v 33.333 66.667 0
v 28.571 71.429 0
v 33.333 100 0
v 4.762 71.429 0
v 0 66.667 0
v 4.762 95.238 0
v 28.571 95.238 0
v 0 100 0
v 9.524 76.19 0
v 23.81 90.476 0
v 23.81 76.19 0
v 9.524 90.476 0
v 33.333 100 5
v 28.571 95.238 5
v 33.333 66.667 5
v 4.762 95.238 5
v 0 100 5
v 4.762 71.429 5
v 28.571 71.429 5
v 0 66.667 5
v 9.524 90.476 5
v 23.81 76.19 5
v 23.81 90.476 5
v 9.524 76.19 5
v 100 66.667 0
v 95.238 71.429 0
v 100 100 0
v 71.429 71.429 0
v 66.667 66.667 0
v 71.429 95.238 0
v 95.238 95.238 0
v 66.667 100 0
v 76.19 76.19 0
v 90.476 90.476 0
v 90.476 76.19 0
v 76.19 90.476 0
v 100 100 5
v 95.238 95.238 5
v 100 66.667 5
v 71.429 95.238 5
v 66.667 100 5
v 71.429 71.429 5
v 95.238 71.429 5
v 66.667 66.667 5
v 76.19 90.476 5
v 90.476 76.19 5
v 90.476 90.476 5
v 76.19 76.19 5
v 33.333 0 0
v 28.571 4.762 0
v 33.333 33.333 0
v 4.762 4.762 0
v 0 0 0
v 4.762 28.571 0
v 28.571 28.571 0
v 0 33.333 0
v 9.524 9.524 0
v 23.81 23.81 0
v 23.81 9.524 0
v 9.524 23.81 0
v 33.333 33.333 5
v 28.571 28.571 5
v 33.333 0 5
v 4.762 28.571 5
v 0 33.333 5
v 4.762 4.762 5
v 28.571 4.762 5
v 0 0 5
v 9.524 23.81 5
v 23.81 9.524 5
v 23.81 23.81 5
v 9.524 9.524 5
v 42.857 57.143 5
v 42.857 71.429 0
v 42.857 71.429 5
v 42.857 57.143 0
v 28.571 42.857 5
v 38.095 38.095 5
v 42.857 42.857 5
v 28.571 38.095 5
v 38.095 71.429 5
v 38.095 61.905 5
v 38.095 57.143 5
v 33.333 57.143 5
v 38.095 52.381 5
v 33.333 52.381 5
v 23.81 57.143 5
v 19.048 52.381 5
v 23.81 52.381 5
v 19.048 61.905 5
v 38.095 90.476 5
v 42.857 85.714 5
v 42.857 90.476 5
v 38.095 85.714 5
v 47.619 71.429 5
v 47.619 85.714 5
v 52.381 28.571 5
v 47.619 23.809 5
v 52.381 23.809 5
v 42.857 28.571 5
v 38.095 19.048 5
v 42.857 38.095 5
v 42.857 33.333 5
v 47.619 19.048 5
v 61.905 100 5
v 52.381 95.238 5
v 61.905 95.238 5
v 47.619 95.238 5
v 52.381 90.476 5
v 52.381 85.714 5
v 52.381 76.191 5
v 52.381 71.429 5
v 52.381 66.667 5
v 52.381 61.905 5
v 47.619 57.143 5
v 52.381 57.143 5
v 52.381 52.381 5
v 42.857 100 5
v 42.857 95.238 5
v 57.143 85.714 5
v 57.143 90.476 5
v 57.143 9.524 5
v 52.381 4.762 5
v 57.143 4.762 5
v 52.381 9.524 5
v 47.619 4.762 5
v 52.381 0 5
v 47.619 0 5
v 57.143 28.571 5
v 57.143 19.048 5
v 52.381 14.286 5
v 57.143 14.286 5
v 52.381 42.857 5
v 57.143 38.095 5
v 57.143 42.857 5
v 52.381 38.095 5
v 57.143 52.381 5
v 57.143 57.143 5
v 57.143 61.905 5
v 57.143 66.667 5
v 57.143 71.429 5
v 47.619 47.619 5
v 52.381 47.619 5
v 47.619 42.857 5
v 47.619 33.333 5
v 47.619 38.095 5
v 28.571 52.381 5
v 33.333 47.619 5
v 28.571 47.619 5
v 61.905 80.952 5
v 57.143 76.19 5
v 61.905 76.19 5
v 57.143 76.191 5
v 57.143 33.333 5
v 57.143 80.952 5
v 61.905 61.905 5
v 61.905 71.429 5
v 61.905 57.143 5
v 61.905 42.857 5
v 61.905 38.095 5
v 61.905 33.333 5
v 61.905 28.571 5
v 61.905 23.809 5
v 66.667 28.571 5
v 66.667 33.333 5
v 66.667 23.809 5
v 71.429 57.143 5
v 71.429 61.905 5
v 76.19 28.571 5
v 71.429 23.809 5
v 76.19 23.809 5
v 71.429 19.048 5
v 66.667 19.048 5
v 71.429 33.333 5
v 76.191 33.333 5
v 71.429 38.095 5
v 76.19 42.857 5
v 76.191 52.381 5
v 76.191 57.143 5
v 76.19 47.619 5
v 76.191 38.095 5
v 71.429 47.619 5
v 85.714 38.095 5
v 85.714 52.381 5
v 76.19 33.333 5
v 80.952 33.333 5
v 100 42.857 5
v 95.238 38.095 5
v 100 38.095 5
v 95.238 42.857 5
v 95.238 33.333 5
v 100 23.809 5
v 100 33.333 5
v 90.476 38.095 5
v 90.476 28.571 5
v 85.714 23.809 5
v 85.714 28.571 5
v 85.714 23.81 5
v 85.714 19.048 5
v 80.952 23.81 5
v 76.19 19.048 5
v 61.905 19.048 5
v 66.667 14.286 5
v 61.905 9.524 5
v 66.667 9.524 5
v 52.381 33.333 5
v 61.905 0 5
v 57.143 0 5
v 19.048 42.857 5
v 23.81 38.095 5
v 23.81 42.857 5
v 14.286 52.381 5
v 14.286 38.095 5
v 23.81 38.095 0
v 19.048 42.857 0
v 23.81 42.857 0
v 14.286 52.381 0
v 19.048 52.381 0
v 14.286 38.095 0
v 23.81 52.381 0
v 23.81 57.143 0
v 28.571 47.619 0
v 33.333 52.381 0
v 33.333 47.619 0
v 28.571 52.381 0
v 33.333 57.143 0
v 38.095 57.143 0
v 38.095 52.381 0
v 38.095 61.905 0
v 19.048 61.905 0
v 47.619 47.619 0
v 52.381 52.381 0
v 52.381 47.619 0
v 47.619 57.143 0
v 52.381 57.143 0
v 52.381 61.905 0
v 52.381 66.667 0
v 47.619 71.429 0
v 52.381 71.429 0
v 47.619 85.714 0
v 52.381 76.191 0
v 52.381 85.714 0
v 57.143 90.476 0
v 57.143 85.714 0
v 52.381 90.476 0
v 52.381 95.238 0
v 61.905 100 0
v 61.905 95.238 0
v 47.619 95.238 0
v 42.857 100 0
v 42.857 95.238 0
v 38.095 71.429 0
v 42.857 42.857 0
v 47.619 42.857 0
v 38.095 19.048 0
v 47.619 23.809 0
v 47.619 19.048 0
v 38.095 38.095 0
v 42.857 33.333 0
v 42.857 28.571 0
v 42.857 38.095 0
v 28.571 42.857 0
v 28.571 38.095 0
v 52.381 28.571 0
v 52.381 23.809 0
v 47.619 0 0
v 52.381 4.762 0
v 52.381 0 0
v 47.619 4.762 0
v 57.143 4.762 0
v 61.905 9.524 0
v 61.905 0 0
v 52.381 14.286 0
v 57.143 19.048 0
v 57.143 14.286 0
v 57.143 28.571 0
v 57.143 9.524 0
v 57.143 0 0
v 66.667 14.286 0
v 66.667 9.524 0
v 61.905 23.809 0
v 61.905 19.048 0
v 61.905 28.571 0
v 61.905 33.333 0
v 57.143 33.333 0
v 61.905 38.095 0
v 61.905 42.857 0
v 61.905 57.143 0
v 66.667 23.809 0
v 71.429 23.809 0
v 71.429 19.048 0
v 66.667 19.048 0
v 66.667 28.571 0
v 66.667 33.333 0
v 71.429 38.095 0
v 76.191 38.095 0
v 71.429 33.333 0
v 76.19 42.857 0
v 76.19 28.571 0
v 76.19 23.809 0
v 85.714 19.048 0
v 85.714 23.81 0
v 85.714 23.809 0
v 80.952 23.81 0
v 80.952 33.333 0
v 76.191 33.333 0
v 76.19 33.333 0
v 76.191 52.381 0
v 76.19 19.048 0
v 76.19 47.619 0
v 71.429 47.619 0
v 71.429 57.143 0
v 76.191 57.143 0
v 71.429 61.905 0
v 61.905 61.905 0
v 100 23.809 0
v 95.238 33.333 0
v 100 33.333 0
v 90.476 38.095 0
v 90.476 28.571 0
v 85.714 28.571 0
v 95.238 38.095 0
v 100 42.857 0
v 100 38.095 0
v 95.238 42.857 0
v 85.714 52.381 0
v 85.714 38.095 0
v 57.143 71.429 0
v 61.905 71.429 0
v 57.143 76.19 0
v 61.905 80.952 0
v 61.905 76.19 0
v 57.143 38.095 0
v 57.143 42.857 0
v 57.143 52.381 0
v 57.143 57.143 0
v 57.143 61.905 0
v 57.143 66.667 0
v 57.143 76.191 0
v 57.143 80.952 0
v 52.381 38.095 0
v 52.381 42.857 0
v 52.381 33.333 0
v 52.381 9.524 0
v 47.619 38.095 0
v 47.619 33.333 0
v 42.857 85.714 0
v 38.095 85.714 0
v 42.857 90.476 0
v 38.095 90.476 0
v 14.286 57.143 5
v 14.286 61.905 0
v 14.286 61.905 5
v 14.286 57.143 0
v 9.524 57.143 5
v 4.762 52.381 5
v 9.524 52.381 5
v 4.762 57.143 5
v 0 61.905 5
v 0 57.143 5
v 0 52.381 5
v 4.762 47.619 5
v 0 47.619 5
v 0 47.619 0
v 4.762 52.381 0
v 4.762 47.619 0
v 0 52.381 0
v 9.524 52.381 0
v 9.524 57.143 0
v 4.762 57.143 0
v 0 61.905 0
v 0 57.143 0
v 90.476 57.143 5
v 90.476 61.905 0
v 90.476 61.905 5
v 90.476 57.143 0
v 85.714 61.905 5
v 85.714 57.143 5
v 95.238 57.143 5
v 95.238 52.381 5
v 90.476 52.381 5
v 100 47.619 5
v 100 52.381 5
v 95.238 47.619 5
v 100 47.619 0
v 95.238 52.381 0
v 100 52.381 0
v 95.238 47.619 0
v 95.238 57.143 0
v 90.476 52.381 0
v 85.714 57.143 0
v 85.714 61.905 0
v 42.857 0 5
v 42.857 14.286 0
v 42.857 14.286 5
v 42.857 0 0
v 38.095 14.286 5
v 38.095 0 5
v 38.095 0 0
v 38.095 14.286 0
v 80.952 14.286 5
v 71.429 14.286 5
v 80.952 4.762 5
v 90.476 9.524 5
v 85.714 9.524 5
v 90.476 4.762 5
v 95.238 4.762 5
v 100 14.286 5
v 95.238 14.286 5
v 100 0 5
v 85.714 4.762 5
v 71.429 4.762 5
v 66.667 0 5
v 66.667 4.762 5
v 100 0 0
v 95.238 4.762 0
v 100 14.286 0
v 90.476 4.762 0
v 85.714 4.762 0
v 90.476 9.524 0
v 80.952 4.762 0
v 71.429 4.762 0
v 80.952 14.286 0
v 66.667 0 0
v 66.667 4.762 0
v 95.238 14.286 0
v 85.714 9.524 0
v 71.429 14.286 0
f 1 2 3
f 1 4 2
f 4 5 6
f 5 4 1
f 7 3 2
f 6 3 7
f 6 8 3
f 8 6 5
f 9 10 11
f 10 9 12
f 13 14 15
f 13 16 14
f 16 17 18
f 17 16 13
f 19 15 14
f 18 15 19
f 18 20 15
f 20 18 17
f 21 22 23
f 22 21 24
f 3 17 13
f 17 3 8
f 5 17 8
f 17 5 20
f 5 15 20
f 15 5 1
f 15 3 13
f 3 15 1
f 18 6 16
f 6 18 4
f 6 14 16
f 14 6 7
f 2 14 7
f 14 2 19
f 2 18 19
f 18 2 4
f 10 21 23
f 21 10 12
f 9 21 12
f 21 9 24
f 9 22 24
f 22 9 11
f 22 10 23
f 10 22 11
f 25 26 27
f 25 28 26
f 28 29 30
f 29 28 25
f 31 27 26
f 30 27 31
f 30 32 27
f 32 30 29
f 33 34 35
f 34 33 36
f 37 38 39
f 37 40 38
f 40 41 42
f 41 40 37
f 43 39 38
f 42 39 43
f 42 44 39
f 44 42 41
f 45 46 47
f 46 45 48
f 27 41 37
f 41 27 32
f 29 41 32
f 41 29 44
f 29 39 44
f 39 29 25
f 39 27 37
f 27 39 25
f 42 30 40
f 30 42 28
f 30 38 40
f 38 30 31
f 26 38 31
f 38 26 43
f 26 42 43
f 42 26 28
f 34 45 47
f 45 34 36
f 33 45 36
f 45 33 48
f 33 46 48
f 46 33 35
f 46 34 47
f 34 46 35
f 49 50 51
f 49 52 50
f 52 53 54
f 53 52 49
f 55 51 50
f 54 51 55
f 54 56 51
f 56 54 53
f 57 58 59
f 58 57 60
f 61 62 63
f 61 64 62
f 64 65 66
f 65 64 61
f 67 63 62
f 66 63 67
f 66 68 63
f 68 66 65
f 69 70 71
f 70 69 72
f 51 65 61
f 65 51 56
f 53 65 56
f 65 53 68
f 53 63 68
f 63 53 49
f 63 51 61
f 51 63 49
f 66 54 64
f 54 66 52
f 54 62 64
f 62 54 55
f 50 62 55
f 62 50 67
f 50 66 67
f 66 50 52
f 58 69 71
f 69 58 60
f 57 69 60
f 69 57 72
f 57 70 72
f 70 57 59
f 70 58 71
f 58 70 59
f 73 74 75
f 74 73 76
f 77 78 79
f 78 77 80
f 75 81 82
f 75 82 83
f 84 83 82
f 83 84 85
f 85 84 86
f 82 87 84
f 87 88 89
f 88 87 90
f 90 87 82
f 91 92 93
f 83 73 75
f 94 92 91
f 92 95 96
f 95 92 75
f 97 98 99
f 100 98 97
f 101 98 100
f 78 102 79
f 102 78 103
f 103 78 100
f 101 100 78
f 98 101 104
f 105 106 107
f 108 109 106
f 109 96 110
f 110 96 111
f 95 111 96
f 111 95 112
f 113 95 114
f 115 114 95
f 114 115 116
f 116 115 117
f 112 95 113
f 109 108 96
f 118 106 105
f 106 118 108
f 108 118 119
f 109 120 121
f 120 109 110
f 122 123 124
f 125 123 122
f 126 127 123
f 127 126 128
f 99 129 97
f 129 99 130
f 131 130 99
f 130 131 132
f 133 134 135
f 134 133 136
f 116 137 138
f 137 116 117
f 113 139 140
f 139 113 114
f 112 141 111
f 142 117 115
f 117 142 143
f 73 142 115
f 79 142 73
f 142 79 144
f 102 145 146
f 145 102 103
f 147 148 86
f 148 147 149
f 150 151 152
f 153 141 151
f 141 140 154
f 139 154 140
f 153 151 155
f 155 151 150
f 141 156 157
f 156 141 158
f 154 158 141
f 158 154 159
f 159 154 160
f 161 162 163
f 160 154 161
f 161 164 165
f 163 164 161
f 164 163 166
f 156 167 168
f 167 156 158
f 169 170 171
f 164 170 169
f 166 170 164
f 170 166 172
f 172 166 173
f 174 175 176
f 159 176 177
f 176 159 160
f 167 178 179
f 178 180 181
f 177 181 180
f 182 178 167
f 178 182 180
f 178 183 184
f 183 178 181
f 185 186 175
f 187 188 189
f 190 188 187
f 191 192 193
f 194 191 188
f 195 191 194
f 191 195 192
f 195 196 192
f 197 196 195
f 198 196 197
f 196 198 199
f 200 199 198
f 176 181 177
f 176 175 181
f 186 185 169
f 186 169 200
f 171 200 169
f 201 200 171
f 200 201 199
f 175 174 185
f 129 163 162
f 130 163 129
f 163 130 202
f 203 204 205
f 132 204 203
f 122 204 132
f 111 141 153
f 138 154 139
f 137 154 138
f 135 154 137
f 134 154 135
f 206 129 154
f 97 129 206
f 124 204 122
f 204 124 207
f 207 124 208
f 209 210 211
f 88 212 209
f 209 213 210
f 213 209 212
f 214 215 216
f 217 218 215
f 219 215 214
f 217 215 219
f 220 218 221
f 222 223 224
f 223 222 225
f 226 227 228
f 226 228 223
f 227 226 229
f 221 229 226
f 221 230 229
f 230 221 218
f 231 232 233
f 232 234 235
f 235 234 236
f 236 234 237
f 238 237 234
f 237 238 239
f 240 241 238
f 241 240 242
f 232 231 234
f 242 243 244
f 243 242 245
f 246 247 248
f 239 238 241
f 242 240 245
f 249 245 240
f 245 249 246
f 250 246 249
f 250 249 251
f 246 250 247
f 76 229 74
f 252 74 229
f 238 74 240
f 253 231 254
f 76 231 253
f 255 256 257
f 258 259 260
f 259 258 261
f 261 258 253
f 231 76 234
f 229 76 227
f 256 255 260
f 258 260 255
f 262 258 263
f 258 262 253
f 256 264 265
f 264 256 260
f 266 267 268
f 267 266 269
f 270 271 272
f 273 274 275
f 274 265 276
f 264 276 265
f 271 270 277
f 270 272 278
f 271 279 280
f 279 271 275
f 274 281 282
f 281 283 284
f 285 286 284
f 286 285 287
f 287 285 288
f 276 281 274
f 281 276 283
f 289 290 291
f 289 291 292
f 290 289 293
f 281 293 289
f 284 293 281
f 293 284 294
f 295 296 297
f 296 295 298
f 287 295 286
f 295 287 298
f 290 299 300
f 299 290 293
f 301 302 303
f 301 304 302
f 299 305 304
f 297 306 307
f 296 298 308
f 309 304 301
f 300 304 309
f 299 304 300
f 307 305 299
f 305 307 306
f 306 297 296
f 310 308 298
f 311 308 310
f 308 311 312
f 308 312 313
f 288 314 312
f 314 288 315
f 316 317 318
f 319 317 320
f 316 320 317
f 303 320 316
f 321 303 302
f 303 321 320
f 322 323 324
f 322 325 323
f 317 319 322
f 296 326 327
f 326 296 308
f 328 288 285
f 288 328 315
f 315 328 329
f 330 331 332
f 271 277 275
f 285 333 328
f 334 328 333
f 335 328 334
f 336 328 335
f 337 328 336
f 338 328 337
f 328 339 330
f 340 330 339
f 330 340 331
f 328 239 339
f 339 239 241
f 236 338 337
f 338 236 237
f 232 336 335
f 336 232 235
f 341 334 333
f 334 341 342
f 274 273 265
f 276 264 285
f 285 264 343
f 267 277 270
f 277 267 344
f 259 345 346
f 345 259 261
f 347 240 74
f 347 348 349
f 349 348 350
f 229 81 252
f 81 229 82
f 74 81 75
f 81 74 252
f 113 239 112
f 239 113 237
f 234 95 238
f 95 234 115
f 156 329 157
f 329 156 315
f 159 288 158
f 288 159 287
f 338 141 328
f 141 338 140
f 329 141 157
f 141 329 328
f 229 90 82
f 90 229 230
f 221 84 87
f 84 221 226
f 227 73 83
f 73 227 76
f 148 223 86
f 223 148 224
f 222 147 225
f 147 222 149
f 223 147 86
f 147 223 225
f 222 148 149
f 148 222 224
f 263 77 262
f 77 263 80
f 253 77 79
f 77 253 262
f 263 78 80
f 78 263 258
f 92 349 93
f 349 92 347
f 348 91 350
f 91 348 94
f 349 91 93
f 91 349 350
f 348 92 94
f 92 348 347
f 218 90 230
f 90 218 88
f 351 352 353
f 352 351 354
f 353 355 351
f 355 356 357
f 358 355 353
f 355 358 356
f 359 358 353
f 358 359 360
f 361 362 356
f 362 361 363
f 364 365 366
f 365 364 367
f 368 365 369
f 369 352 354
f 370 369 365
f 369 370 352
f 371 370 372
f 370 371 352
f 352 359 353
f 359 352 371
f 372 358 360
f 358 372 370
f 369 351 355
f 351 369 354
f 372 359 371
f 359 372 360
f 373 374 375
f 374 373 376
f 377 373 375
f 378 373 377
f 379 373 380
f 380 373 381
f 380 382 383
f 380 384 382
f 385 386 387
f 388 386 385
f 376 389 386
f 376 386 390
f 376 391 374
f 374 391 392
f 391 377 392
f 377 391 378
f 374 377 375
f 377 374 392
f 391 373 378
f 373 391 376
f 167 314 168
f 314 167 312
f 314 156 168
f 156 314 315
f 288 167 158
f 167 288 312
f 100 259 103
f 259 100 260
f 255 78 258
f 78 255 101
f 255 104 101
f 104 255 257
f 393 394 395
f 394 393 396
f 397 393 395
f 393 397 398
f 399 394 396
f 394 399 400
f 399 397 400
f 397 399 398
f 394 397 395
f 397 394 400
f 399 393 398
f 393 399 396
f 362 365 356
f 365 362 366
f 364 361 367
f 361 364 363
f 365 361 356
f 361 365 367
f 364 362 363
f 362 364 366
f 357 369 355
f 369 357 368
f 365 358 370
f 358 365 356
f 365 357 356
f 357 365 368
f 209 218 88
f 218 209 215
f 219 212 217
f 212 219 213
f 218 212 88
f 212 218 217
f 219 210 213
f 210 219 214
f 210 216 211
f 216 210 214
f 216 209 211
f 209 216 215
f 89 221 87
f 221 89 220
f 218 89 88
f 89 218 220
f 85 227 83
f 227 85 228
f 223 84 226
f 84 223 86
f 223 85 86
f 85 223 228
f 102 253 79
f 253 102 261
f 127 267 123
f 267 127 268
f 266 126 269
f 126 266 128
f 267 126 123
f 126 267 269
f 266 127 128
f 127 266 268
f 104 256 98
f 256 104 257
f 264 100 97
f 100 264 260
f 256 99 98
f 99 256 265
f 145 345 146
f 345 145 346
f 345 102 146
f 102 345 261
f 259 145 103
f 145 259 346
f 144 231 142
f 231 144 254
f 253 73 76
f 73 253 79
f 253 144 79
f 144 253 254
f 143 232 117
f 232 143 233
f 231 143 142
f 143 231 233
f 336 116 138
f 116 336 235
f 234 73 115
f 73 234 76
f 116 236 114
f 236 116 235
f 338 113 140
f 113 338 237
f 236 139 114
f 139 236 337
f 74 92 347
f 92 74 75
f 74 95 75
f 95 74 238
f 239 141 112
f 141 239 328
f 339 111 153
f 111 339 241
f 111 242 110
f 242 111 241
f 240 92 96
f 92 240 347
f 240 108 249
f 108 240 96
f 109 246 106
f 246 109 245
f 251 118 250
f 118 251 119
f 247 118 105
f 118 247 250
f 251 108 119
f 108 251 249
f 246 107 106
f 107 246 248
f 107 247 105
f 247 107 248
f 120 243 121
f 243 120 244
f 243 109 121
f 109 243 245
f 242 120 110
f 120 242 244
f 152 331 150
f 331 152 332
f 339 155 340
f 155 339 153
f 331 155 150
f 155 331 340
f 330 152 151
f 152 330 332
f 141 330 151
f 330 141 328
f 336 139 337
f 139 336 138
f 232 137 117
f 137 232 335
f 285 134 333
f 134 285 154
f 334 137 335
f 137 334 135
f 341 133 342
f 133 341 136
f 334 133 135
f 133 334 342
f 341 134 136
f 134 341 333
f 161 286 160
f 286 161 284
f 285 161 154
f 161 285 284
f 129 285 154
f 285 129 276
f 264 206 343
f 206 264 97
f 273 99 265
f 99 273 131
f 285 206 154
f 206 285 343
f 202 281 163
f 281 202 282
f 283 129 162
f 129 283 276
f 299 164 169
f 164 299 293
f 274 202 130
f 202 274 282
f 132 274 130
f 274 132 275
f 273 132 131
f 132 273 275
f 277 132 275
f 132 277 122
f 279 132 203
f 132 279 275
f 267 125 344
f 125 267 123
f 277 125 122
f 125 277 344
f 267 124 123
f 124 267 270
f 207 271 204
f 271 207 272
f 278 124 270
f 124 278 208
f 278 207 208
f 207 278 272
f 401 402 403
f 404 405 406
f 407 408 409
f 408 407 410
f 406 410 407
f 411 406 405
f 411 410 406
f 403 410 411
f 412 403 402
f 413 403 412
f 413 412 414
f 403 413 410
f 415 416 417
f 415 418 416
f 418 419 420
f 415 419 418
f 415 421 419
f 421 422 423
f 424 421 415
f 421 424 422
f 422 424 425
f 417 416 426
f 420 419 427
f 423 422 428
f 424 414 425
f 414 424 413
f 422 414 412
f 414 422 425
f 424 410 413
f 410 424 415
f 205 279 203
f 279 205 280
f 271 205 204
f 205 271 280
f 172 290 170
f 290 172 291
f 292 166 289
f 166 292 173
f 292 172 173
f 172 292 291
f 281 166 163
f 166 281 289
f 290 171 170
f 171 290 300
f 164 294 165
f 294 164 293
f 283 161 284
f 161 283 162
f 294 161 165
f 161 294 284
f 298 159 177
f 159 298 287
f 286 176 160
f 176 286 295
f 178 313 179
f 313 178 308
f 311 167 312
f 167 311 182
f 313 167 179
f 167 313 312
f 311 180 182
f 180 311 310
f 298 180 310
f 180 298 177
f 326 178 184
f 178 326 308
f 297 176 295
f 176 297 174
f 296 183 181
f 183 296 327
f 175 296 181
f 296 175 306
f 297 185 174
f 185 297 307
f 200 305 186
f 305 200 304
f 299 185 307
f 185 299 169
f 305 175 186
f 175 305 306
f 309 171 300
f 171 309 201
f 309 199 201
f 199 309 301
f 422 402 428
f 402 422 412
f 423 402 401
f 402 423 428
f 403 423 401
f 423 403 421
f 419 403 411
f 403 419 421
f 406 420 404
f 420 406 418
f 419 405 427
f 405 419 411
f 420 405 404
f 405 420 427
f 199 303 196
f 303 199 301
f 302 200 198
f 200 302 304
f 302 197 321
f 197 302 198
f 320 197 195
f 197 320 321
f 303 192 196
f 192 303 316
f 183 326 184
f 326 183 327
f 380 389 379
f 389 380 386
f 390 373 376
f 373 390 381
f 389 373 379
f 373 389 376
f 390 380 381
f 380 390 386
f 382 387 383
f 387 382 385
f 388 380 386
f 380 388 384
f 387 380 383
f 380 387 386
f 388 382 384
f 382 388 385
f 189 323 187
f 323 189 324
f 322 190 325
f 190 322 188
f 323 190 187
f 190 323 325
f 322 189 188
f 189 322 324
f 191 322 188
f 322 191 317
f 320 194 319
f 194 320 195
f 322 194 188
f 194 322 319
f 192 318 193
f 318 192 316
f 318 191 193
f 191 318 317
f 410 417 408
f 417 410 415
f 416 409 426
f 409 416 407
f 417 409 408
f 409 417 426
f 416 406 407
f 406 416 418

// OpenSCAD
// QR code purpose (configure the section depending on the type you choose here)
qrcode_type = "text"; // [text:"Text/URL", wifi:"Wi-Fi", phone:"Phone Number", vcard:"Contact Info (VCard)"]

/* [Text/URL] */
// Content of the QR code
text = "some text or url";

/* [Wi-Fi] */
// SSID wifi network name
ssid = "wifi_network";
// Wi-Fi password
psk = "1234";
// Autentication type
auth = "WPA";// [WPA:"WPA/WPA2 (password protected)", nopass:"open network (no password)", WEP:"WEP (obsolete password protection)"]
// Whether network is hidden
hidden = 0; // [ 0:false, 1:true ]

/* [Phone] */
// Phone number
phone = "0123456789";

/* [Contact Info] */
// Last name
vc_lastname = "Doe";
// First name
vc_firstname = "John";
// Middle names
vc_middlenames = "";
// Honorary prefixes
vc_nameprefixes = "Dr.";
// Honorary suffixes
vc_namesuffixes = "";
// Full name (blank for auto)
vc_customfullname = "";
// Email address
vc_email = "john@johndoe.example.com";
// URL (e.g. website)
vc_url = "https://johndoe.example.com";
// Phone number
vc_phone = "0123456789";
// Street address
vc_address = "123 Example St.";
// Extended address (e.g. apartment or suite number)
vc_ext_address = "";
// City
vc_city = "New York";
// Region (e.g. state or province)
vc_region = "NY";
// Postal code
vc_postalcode = "10002";
// Country
vc_country = "United States";

/* [Dimensions] */
// Width of the QR code
width = 100; // [1:1000]
// Height of the QR code
height = 100; // [1:1000]
// Thickness of the QR code
thickness = 5; // [1:50]
// Place the QR code in the center
center = 0; // [0:false, 1:true]

/* [QR code parameters (advanced)] */
// Error correction level
error_correction = "L"; // [L:"Low (~7%)", M:"Medium (~15%)", Q: "Quartile (~25%)", H: "High (~30%)"]
// Mask pattern
mask_pattern = 0; // [0:"000: (y + x)%2=0", 1:"001: y % 2=0", 2:"010: x % 3=0", 3:"011: (y + x)%3=0", 4:"100: (y/2 + x/3)%2=0", 5:"101: (y*x)%2+(y*x)%3=0", 6:"110: ((y*x)%3+y*x)%2=0", 7:"111: ((y*x)%3+y+x)%2=0"]
// Character encoding
encoding = "UTF-8"; // [ UTF-8:"UTF-8 (Unicode)", Shift_JIS:"Shift JIS (Shift Japanese International Standards)"]

include <qr.scad>

content =
    qrcode_type == "wifi" ? qr_wifi(ssid, psk, auth, hidden) :
    qrcode_type == "phone" ? qr_phone_call(phone) :
    qrcode_type == "vcard" ? qr_vcard(vc_lastname, vc_firstname, vc_middlenames, vc_nameprefixes, vc_namesuffixes, vc_customfullname, vc_email, vc_url, vc_phone, vc_address, vc_ext_address, vc_city, vc_region, vc_postalcode, vc_country) :
    text;

color("black")
qr(content, error_correction, width, height, thickness, center, mask_pattern, encoding);
